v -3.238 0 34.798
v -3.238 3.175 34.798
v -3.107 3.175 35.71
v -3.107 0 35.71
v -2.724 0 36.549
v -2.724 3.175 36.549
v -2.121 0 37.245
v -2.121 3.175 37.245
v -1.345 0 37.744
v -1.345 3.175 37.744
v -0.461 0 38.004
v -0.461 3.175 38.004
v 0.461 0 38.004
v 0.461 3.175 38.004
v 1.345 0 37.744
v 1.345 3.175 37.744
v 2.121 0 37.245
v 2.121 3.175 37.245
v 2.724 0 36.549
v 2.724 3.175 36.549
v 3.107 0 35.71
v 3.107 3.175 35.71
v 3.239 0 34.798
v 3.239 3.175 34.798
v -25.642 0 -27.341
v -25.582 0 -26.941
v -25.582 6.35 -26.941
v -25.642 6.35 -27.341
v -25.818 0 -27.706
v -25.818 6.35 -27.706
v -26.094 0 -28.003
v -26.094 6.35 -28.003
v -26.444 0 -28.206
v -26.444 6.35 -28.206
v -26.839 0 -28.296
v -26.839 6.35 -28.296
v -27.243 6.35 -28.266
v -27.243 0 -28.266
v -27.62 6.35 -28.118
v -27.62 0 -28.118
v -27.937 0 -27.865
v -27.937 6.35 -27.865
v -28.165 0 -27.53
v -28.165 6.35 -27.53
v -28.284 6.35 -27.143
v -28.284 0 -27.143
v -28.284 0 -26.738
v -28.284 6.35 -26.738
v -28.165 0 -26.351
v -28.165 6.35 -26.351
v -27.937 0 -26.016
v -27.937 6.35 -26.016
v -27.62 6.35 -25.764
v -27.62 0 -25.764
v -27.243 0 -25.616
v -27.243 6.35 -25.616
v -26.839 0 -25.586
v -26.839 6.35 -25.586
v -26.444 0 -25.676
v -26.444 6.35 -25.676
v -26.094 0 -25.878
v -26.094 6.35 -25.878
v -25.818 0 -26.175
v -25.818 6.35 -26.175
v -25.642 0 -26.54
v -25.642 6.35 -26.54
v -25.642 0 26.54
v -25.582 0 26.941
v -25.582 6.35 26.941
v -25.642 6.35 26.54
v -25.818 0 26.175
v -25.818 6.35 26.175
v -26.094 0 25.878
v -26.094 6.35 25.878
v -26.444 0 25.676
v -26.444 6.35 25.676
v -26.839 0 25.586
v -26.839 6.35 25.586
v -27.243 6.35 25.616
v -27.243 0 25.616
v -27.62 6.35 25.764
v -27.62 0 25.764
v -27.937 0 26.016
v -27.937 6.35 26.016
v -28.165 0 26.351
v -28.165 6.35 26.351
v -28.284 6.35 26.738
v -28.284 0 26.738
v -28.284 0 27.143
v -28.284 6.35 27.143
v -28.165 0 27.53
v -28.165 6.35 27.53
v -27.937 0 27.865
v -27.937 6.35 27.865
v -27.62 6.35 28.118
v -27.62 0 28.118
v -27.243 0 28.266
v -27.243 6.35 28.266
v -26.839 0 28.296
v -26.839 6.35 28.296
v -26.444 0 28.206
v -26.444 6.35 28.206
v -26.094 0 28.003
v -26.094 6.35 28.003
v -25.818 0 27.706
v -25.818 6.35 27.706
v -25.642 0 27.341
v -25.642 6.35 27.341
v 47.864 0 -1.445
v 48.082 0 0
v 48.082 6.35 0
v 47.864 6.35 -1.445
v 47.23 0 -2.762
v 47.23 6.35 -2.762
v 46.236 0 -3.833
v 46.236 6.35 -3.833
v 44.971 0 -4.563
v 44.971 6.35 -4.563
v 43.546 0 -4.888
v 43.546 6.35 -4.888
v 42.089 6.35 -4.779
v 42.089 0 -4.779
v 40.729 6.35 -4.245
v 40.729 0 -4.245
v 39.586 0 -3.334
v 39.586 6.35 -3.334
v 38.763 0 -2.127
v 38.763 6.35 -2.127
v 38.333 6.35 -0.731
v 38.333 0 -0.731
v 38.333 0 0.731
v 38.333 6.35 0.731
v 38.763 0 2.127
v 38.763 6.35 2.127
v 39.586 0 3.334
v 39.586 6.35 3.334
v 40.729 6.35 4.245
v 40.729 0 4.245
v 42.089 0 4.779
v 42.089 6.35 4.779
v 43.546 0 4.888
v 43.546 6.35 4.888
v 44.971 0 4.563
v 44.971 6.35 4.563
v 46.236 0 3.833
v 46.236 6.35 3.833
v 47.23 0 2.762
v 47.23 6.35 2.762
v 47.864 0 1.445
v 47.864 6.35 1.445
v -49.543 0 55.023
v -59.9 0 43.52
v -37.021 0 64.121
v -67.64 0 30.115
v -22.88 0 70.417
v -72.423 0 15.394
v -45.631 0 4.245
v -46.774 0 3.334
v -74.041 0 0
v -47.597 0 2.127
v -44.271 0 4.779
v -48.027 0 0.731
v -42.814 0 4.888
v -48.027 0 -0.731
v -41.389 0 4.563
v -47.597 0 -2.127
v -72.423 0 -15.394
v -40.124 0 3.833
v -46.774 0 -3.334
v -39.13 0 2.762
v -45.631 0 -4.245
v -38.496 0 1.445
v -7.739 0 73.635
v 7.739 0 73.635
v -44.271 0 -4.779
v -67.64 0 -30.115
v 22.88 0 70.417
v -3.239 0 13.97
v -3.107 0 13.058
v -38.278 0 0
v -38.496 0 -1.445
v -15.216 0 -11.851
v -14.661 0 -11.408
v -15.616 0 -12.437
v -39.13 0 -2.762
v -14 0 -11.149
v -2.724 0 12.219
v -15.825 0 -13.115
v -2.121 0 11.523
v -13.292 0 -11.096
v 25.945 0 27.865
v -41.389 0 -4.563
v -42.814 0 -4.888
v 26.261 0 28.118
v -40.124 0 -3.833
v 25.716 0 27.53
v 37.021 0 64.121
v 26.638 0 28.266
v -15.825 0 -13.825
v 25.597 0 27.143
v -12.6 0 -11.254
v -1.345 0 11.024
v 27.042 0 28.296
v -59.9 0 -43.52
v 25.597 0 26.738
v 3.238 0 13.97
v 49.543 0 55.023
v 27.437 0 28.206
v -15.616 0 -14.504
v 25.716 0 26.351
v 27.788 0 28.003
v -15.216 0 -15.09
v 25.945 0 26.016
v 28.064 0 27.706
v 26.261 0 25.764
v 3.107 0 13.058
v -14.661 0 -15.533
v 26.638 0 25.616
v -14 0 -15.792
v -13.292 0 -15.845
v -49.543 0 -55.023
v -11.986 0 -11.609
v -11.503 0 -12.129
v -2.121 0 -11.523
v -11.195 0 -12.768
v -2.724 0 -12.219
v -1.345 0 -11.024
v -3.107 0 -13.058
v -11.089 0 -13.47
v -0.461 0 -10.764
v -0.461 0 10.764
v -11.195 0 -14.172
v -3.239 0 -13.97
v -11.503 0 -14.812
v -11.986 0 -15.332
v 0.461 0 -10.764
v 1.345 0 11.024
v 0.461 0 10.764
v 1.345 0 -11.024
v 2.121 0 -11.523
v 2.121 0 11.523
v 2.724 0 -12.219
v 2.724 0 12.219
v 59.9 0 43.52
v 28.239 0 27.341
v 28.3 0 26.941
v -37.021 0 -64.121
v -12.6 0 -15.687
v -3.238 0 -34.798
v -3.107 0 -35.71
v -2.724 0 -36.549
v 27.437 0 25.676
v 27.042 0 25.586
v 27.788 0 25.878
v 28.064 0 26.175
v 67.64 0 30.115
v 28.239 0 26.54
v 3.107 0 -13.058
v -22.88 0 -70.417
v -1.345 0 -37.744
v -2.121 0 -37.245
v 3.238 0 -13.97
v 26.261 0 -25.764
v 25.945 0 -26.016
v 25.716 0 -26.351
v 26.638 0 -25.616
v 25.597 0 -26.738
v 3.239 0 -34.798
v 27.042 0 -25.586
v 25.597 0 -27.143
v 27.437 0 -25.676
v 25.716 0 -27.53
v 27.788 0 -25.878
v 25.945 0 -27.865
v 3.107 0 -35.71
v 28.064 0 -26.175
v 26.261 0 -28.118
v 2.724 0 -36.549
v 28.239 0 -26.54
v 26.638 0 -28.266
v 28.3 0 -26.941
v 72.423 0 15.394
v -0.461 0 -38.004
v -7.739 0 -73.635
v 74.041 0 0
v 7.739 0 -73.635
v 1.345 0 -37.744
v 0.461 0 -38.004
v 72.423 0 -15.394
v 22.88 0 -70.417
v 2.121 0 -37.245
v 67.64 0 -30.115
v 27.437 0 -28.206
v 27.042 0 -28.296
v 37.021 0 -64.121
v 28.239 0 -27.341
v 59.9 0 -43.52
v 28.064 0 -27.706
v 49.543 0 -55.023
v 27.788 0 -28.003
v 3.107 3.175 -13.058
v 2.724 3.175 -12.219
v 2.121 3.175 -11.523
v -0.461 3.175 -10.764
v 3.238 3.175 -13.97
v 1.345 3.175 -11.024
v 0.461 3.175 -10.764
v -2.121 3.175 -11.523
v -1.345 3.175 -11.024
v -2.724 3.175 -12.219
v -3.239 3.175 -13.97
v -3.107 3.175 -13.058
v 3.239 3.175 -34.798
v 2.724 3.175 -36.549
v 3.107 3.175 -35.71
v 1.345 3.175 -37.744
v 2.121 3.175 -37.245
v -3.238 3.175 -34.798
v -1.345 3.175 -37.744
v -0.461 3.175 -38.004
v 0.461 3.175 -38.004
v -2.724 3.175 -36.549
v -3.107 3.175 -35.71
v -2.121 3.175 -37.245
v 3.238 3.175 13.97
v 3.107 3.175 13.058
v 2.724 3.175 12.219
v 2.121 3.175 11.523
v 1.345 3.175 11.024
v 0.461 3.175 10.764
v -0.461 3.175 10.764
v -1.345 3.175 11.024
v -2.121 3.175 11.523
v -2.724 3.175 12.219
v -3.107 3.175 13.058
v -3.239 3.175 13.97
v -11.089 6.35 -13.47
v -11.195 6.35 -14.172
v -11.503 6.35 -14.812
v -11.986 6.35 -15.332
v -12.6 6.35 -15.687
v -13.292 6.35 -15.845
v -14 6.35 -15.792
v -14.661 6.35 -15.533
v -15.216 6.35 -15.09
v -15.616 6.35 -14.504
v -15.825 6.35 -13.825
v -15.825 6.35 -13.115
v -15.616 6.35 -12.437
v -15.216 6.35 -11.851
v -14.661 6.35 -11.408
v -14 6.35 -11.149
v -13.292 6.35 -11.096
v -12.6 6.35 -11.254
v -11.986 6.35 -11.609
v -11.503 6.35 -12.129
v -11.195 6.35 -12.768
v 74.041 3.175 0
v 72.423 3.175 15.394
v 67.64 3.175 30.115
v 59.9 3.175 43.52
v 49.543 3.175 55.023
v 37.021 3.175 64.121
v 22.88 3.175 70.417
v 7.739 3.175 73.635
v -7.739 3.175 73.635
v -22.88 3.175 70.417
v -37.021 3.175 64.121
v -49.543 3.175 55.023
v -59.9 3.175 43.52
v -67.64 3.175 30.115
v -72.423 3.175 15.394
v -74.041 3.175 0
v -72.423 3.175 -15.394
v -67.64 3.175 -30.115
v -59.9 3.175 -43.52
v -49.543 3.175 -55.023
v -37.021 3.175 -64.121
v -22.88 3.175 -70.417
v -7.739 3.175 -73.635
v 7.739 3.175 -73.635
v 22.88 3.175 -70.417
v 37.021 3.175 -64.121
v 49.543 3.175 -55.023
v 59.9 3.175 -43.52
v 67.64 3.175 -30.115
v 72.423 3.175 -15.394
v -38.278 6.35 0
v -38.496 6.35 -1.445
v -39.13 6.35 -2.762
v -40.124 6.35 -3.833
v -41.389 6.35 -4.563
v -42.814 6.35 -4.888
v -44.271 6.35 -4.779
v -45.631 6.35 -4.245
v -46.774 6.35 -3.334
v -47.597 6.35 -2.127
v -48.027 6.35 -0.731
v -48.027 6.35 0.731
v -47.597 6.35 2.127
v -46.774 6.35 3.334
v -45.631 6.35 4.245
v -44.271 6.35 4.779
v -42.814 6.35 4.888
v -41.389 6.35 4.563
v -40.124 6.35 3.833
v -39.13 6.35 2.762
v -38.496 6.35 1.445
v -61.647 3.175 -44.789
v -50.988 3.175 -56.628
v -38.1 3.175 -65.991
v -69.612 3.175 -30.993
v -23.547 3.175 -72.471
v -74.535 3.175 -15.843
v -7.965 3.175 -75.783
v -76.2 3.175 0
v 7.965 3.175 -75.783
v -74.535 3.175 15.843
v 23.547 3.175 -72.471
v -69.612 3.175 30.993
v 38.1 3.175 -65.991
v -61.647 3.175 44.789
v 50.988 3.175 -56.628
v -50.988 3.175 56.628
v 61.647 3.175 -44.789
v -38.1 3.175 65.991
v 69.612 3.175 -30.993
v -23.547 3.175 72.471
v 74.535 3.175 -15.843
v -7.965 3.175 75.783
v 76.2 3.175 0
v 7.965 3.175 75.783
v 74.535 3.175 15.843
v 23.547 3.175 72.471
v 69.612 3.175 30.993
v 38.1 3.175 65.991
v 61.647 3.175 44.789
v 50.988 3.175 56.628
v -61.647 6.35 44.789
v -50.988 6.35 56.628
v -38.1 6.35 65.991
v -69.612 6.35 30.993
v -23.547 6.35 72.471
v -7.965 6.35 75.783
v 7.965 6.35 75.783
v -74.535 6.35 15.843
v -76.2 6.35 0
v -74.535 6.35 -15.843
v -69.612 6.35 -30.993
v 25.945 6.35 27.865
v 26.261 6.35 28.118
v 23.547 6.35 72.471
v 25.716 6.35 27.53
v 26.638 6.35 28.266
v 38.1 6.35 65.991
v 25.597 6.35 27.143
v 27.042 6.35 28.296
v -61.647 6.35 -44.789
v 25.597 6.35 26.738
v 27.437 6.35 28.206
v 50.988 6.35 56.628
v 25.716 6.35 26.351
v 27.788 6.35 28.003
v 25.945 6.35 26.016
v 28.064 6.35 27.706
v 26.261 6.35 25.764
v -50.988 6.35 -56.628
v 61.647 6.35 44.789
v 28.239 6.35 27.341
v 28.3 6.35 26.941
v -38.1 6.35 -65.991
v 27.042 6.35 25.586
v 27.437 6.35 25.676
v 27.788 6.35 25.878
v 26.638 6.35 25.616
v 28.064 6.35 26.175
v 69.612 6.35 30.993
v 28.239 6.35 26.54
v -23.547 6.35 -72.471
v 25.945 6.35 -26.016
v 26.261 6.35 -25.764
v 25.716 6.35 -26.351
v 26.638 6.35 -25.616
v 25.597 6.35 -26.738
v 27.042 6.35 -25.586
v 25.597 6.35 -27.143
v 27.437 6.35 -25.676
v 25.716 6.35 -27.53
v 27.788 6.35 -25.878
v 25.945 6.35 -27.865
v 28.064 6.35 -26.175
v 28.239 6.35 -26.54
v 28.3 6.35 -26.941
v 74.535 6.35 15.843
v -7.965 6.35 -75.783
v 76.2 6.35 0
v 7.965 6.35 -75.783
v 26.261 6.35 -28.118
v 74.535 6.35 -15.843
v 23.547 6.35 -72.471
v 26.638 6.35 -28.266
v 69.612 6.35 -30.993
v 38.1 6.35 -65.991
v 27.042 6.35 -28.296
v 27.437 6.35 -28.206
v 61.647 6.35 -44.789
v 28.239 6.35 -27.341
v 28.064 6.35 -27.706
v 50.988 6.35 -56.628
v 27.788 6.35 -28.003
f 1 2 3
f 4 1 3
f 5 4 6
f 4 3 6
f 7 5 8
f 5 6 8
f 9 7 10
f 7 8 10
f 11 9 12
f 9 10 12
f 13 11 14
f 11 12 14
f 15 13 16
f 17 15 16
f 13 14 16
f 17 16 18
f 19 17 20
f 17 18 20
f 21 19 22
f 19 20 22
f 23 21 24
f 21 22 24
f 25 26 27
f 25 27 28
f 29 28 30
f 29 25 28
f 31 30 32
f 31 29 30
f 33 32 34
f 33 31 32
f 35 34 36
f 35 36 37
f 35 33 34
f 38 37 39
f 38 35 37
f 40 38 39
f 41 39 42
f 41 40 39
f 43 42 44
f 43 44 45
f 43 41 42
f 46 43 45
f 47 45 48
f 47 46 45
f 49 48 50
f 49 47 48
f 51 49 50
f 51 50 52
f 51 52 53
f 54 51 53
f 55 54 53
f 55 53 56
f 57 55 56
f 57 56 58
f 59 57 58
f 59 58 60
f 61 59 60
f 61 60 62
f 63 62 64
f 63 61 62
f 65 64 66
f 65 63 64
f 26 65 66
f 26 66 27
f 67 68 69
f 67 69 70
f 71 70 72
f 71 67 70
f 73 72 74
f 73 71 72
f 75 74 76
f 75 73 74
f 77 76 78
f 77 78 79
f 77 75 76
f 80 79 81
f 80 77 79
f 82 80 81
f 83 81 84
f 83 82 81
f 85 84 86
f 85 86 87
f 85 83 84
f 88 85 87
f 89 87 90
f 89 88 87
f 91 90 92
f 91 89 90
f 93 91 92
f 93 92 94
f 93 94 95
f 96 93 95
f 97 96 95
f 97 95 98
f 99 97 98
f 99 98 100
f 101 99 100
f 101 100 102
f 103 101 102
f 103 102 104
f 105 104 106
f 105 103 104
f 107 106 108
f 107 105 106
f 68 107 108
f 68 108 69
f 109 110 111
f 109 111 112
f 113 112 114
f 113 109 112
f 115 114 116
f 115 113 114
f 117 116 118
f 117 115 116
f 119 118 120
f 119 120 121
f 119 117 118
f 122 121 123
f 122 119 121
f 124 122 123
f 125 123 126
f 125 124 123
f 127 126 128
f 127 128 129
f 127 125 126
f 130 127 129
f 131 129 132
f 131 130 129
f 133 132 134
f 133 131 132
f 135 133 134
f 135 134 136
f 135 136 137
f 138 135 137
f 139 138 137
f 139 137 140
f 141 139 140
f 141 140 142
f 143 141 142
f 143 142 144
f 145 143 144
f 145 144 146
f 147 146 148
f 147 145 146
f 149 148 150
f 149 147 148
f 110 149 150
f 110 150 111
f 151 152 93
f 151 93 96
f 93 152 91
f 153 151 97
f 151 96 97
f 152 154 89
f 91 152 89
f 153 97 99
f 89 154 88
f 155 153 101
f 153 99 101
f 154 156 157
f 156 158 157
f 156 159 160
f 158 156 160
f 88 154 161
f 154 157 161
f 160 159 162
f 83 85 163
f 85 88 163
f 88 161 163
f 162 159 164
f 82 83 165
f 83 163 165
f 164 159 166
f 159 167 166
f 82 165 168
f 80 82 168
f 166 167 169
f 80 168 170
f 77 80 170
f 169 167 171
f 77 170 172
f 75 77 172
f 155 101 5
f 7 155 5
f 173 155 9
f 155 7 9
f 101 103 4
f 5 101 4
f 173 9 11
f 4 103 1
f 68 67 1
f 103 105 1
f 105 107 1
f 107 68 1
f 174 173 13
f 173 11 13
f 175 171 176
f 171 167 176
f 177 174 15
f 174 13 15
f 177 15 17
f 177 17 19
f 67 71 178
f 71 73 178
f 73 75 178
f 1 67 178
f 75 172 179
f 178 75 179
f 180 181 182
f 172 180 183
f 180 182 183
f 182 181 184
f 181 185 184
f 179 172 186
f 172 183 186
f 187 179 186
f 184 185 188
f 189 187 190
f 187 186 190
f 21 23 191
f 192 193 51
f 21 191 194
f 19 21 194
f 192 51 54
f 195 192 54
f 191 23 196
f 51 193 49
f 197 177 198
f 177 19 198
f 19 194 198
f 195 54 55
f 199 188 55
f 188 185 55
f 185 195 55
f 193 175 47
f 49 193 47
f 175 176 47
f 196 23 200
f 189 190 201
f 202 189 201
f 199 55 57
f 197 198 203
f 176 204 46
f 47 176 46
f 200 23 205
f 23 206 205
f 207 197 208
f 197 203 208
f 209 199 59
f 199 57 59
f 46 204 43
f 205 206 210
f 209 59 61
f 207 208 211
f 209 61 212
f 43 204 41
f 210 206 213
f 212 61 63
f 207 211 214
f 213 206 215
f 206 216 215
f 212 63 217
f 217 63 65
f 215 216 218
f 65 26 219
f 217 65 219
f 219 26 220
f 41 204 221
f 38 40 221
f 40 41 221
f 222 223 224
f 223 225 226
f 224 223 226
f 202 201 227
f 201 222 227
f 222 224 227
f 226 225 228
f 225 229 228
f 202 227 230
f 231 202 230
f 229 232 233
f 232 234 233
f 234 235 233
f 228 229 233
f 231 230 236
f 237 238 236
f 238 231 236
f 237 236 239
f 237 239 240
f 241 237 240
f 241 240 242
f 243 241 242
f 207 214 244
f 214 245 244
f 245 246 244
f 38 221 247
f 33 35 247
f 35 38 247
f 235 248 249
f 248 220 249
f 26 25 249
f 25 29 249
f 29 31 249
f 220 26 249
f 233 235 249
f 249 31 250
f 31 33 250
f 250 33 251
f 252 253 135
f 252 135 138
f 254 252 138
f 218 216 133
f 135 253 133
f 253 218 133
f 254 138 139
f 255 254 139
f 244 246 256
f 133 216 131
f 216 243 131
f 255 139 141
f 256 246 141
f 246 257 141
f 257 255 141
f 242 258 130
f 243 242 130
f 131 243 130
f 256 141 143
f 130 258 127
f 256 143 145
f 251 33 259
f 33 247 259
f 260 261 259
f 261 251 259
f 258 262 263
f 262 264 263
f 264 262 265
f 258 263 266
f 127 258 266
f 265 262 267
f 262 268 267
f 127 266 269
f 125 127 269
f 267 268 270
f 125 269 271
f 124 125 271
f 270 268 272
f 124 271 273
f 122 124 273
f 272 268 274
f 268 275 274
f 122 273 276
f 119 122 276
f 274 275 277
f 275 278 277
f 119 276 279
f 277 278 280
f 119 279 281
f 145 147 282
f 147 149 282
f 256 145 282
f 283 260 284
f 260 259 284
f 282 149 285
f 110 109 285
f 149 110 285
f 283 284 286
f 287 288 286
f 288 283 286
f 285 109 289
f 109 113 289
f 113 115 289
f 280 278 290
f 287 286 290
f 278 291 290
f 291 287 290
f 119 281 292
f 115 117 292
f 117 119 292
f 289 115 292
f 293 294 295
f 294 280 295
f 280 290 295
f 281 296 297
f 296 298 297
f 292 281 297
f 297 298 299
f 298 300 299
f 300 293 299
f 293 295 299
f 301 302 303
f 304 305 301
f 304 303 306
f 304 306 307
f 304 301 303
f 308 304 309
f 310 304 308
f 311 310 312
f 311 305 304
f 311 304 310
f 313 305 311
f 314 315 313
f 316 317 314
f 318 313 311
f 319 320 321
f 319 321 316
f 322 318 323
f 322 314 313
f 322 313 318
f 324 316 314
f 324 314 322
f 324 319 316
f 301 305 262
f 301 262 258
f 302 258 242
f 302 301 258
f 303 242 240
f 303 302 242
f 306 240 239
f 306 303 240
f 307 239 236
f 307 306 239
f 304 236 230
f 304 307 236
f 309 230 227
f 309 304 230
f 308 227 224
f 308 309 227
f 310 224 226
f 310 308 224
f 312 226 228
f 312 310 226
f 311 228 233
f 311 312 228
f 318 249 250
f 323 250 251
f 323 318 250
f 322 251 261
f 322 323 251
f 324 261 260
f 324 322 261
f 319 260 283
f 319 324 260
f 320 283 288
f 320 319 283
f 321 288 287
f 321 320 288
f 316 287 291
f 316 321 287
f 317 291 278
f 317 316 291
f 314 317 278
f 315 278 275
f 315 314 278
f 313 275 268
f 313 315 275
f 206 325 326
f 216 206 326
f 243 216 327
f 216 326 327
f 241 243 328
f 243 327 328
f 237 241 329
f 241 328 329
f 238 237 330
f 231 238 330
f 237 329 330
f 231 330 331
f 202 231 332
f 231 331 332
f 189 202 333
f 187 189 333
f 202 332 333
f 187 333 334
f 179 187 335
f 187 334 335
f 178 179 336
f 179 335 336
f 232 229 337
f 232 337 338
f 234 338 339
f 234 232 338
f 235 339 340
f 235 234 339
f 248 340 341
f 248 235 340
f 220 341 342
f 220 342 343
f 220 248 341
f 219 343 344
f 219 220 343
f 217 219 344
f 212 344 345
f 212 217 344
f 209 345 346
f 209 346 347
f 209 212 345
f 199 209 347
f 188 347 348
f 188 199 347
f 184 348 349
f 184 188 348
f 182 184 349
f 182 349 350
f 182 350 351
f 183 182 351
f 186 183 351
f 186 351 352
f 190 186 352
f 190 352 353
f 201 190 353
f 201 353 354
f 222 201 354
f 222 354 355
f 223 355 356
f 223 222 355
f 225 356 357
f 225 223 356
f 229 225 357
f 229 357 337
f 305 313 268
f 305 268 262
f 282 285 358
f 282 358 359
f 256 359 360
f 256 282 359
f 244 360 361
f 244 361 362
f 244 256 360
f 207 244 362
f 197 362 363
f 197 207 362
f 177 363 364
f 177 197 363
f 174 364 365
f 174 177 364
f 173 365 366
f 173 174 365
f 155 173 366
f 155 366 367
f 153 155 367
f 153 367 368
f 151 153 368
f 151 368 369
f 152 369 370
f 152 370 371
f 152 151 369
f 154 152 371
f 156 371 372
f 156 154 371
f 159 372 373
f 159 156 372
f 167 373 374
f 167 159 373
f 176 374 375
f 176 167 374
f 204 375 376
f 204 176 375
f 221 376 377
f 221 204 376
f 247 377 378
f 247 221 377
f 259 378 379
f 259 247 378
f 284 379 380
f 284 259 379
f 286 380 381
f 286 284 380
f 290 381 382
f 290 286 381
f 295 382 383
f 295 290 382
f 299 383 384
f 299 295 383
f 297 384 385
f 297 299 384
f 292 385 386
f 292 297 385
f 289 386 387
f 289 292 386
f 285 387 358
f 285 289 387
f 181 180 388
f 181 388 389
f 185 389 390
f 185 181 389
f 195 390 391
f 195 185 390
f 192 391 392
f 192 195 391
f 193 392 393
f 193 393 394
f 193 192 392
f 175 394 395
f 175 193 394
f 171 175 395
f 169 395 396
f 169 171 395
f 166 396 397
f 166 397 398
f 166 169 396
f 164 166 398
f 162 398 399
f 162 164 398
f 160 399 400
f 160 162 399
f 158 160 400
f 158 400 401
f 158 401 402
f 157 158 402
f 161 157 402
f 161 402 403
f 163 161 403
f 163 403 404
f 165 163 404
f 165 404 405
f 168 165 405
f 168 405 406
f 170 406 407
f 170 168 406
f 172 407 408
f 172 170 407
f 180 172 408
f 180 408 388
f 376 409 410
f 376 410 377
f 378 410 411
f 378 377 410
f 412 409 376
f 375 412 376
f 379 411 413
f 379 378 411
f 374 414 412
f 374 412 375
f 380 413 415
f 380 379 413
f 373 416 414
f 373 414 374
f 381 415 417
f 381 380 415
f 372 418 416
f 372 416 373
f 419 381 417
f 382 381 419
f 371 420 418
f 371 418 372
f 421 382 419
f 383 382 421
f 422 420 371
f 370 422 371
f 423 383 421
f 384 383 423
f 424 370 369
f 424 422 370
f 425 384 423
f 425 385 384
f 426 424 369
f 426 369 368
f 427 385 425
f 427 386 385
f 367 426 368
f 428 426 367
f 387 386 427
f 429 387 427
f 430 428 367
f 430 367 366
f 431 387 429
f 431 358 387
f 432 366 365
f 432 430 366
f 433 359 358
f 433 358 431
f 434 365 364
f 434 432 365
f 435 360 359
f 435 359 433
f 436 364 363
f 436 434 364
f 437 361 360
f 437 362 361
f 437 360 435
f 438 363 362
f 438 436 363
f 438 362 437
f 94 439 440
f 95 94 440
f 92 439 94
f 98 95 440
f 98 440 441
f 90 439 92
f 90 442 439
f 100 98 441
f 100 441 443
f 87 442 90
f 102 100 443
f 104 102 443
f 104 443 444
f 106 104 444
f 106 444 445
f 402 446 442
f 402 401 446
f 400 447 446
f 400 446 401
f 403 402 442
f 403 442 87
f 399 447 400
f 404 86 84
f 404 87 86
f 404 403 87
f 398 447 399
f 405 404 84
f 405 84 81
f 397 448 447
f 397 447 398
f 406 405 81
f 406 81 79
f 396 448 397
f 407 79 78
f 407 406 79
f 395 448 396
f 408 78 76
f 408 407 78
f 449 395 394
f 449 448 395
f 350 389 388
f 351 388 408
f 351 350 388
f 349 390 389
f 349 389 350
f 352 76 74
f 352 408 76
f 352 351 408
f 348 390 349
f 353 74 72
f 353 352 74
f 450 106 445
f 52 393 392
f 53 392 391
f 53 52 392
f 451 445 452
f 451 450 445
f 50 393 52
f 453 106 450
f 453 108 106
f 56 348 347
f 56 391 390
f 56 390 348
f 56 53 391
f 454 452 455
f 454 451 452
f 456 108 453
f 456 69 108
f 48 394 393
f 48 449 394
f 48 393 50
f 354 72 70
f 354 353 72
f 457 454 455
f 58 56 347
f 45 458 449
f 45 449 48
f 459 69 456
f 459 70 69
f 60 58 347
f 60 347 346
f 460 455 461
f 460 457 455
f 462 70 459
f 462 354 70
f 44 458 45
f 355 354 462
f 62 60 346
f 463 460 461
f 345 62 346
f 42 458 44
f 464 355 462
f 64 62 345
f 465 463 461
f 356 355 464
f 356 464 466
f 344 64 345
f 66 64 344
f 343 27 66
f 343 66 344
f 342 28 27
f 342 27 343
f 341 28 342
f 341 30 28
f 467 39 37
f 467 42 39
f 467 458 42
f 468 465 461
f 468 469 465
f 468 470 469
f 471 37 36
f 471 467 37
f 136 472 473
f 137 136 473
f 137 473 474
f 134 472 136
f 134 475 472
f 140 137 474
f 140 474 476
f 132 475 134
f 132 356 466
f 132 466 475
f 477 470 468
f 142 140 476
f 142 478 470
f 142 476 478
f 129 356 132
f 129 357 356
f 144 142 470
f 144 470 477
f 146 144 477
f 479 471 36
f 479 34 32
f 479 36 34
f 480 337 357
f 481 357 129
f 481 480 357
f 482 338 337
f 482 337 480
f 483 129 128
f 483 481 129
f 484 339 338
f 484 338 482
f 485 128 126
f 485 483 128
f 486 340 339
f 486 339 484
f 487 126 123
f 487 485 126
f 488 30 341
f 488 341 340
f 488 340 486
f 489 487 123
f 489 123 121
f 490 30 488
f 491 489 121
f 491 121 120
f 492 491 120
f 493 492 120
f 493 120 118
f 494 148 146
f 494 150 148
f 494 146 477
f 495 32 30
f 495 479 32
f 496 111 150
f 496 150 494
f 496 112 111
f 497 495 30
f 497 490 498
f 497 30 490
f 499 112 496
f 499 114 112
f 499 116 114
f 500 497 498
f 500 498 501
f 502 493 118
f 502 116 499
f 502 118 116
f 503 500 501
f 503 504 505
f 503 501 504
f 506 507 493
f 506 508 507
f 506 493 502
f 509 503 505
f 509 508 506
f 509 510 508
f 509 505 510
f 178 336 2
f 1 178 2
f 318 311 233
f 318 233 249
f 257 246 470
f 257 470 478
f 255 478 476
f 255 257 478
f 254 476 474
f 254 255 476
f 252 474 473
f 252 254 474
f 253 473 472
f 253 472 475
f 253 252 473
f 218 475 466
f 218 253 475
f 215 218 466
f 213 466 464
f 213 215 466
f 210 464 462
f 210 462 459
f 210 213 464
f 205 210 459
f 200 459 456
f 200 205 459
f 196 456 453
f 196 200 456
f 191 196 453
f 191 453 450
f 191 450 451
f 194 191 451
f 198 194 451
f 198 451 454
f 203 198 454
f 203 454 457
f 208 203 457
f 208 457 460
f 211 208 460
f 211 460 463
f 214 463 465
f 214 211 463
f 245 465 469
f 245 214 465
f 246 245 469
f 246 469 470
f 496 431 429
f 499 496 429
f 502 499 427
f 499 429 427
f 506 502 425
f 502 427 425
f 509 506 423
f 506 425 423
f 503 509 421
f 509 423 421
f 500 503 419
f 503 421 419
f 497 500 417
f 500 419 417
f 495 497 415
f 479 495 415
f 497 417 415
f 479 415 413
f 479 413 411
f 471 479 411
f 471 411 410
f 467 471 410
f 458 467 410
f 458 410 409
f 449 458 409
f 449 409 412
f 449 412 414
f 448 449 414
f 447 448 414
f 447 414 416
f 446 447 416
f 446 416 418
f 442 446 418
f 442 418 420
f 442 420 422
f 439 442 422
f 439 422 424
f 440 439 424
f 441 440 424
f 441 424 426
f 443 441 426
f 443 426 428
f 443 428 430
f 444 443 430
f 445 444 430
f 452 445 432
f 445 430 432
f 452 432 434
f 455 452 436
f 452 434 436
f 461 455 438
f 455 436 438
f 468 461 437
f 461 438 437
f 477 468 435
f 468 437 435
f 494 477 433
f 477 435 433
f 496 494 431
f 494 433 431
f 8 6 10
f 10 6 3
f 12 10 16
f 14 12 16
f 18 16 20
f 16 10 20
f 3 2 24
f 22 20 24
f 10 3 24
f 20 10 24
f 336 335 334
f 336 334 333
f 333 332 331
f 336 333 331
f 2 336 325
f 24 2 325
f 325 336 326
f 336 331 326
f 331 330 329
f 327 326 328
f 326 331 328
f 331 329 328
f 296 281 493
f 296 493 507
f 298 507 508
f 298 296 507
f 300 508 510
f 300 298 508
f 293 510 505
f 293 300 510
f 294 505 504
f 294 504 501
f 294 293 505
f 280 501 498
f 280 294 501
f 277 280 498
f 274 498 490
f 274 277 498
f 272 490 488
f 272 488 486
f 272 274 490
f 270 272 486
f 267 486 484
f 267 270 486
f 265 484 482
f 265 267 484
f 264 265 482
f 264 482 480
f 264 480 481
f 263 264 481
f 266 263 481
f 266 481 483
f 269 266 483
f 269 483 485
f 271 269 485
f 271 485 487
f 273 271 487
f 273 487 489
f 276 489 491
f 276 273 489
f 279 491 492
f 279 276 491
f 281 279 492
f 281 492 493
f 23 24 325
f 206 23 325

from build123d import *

# Parameters (mm, degrees)
SKETCH1_R           = 76.2
SKETCH1_R_2         = 1.3589
SKETCH1_R_3         = 4.9022
SKETCH1_R_4         = 2.38125
BOSS_EXTRUDE1_DEPTH = 6.35
SKETCH2_R           = 76.2
SKETCH2_R_2         = 74.041
CUT_EXTRUDE1_DEPTH  = 3.175
CUT_EXTRUDE2_START  = -3.175
CUT_EXTRUDE2_DEPTH  = 3.556


with BuildPart() as part:
    # Sketch1 → Boss-Extrude1 (new body)
    with BuildSketch(Plane(origin=(0, 0, 0), x_dir=(1, 0, 0), z_dir=(0, 1, 0))):
        Circle(SKETCH1_R)
        with Locations((26.940768363, 26.940768363)):
            Circle(SKETCH1_R_2, mode=Mode.SUBTRACT)
        with Locations((26.940768363, -26.940768363)):
            Circle(SKETCH1_R_2, mode=Mode.SUBTRACT)
        with Locations((-26.940768363, 26.940768363)):
            Circle(SKETCH1_R_2, mode=Mode.SUBTRACT)
        with Locations((43.18, 0)):
            Circle(SKETCH1_R_3, mode=Mode.SUBTRACT)
        with Locations((-43.18, 0)):
            Circle(SKETCH1_R_3, mode=Mode.SUBTRACT)
        with Locations((-13.470384182, 13.470384182)):
            Circle(SKETCH1_R_4, mode=Mode.SUBTRACT)
        with Locations((-26.940768363, -26.940768363)):
            Circle(SKETCH1_R_2, mode=Mode.SUBTRACT)
    extrude(amount=BOSS_EXTRUDE1_DEPTH)

    # Sketch2 → Cut-Extrude1 (cut)
    with BuildSketch(Plane.XZ):
        Circle(SKETCH2_R)
        Circle(SKETCH2_R_2, mode=Mode.SUBTRACT)
    extrude(amount=-CUT_EXTRUDE1_DEPTH, mode=Mode.SUBTRACT)

    # Sketch3 → Cut-Extrude2 (cut)
    with BuildSketch(Plane(origin=(0, 6.35, 0), x_dir=(1, 0, 0), z_dir=(0, 1, 0)).offset(CUT_EXTRUDE2_START)):
        with BuildLine():
            Line((3.2385, 34.798), (3.2385, 13.97))
            ThreePointArc((3.2385, 13.97), (0, 10.7315), (-3.2385, 13.97))
            Line((-3.2385, 13.97), (-3.2385, 34.798))
            ThreePointArc((-3.2385, 34.798), (0, 38.0365), (3.2385, 34.798))
        make_face()
        with BuildLine():
            Line((3.2385, -34.798), (3.2385, -13.97))
            ThreePointArc((3.2385, -13.97), (0, -10.7315), (-3.2385, -13.97))
            Line((-3.2385, -13.97), (-3.2385, -34.798))
            ThreePointArc((-3.2385, -34.798), (0, -38.0365), (3.2385, -34.798))
        make_face()
    extrude(amount=-CUT_EXTRUDE2_DEPTH, mode=Mode.SUBTRACT)


solid = part.part
